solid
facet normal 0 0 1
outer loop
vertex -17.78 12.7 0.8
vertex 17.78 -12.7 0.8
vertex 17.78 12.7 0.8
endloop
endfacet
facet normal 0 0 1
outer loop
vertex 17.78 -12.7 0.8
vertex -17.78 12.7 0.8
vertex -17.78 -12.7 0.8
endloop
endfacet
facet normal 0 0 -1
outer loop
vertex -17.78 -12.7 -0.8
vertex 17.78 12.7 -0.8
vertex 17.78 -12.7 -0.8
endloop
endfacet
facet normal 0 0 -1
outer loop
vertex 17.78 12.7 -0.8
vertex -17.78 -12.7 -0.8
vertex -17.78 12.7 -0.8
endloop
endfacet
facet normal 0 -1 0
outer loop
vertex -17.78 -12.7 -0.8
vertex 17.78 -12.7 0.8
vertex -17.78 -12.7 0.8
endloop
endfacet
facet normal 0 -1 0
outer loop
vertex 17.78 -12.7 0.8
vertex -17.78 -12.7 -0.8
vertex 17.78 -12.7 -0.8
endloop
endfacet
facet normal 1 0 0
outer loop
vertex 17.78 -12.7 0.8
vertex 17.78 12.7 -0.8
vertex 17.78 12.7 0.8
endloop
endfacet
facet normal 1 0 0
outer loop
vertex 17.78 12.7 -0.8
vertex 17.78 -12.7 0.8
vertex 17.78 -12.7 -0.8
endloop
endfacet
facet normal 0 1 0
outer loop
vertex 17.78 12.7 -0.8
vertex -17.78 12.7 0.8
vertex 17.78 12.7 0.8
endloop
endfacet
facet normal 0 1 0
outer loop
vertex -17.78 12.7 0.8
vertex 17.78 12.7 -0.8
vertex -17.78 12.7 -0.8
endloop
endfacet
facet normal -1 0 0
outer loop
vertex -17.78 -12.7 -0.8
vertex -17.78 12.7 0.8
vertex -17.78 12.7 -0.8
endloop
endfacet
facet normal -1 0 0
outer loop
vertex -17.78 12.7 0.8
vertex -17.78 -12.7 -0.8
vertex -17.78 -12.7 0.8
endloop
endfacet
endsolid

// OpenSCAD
// Parameters
pcb_length = 35.56; //[17.78:71.12:0.01]
pcb_width = 25.4; //[12.7:50.8:0.01]
pcb_thickness = 1.6; //[0.8:3.2:0.1]

// Geometry
module pcb_body() {
  color([0.0, 0.4, 0.2]) // Green color for PCB
  translate([0, 0, 0])
    cube([pcb_length, pcb_width, pcb_thickness], center=true);
}

// Final Output
module pcb_model() {
  union() {
    pcb_body();
  }
}

// Render the PCB model
pcb_model();
